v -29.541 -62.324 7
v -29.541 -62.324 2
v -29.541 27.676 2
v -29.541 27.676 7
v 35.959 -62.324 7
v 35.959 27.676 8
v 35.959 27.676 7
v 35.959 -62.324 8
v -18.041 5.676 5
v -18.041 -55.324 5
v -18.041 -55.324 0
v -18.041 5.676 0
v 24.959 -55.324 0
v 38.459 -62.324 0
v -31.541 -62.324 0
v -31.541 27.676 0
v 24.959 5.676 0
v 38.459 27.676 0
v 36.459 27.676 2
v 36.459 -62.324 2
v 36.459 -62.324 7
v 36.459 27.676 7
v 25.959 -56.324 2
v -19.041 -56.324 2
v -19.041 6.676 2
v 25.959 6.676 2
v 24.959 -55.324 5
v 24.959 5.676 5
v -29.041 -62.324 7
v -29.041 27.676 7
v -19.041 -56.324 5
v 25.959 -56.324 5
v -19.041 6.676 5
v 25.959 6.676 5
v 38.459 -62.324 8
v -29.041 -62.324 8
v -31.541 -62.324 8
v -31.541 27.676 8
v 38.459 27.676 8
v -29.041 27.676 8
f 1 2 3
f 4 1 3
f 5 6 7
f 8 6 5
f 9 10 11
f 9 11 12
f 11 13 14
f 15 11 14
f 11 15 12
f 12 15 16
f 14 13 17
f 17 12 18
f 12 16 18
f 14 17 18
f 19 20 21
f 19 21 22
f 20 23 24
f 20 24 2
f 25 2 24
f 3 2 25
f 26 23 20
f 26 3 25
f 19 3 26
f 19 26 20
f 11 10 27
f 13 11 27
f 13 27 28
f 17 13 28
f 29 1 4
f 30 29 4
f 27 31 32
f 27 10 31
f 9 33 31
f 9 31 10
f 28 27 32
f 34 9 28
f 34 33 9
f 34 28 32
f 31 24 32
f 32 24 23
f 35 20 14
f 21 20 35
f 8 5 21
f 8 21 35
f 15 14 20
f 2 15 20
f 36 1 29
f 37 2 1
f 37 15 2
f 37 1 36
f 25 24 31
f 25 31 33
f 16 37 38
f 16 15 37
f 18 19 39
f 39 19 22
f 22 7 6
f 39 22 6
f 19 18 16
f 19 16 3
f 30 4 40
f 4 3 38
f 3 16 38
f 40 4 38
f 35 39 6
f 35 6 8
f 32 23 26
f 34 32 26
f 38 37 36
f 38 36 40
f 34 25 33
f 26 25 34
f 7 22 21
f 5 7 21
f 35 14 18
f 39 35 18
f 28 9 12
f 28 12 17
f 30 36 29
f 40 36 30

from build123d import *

# Parameters (mm, degrees)
SKETCH_W        = 70
SKETCH_H        = 90
PAD_DEPTH       = 2
SKETCH001_W     = 43
SKETCH001_H     = 61
POCKET_DEPTH    = 2
SKETCH002_W     = 45
SKETCH002_H     = 63
PAD001_DEPTH    = 3
SKETCH003_W     = 43
SKETCH003_H     = 61
POCKET001_DEPTH = 3
SKETCH004_W     = 2
SKETCH004_H     = 90
PAD002_DEPTH    = 6
SKETCH005_W     = 90
SKETCH005_H     = 1
PAD003_DEPTH    = 0.5
SKETCH006_W     = 90
SKETCH006_H     = 1
PAD004_DEPTH    = 0.5


with BuildPart() as part:
    # Sketch → Pad (new body)
    with BuildSketch(Plane.XY):
        with Locations((3.459163, -17.324317)):
            Rectangle(SKETCH_W, SKETCH_H)
    extrude(amount=PAD_DEPTH)

    # Sketch001 (on Face6 of Pad) → Pocket (cut)
    with BuildSketch(Plane.XY.offset(2)):
        with Locations((3.459163, -24.824317)):
            Rectangle(SKETCH001_W, SKETCH001_H)
    extrude(amount=-POCKET_DEPTH, mode=Mode.SUBTRACT)

    # Sketch002 (on Face5 of Pocket) → Pad001 (join)
    with BuildSketch(Plane.XY.offset(2)):
        with Locations((3.459163, -24.824317)):
            Rectangle(SKETCH002_W, SKETCH002_H)
    extrude(amount=PAD001_DEPTH)

    # Sketch003 (on Face16 of Pad001) → Pocket001 (cut)
    with BuildSketch(Plane.XY.offset(5)):
        with Locations((3.459163, -24.824317)):
            Rectangle(SKETCH003_W, SKETCH003_H)
    extrude(amount=-POCKET001_DEPTH, mode=Mode.SUBTRACT)

    # Sketch004 (on Face5 of Pocket001) → Pad002 (join)
    with BuildSketch(Plane.XY.offset(2)):
        with Locations((-30.540837, -17.324317)):
            Rectangle(SKETCH004_W, SKETCH004_H)
        with Locations((37.459163, -17.324317)):
            Rectangle(SKETCH004_W, SKETCH004_H)
    extrude(amount=PAD002_DEPTH)

    # Sketch005 (on Face17 of Pad002) → Pad003 (join)
    with BuildSketch(Plane(origin=(36.459163, 0, 0), x_dir=(0, -1, 0), z_dir=(-1, 0, 0))):
        with Locations((17.324317, 7.5)):
            Rectangle(SKETCH005_W, SKETCH005_H)
    extrude(amount=PAD003_DEPTH)

    # Sketch006 (on Face15 of Pad003) → Pad004 (join)
    with BuildSketch(Plane.YZ.offset(-29.540837)):
        with Locations((-17.324317, 7.5)):
            Rectangle(SKETCH006_W, SKETCH006_H)
    extrude(amount=PAD004_DEPTH)


solid = part.part
